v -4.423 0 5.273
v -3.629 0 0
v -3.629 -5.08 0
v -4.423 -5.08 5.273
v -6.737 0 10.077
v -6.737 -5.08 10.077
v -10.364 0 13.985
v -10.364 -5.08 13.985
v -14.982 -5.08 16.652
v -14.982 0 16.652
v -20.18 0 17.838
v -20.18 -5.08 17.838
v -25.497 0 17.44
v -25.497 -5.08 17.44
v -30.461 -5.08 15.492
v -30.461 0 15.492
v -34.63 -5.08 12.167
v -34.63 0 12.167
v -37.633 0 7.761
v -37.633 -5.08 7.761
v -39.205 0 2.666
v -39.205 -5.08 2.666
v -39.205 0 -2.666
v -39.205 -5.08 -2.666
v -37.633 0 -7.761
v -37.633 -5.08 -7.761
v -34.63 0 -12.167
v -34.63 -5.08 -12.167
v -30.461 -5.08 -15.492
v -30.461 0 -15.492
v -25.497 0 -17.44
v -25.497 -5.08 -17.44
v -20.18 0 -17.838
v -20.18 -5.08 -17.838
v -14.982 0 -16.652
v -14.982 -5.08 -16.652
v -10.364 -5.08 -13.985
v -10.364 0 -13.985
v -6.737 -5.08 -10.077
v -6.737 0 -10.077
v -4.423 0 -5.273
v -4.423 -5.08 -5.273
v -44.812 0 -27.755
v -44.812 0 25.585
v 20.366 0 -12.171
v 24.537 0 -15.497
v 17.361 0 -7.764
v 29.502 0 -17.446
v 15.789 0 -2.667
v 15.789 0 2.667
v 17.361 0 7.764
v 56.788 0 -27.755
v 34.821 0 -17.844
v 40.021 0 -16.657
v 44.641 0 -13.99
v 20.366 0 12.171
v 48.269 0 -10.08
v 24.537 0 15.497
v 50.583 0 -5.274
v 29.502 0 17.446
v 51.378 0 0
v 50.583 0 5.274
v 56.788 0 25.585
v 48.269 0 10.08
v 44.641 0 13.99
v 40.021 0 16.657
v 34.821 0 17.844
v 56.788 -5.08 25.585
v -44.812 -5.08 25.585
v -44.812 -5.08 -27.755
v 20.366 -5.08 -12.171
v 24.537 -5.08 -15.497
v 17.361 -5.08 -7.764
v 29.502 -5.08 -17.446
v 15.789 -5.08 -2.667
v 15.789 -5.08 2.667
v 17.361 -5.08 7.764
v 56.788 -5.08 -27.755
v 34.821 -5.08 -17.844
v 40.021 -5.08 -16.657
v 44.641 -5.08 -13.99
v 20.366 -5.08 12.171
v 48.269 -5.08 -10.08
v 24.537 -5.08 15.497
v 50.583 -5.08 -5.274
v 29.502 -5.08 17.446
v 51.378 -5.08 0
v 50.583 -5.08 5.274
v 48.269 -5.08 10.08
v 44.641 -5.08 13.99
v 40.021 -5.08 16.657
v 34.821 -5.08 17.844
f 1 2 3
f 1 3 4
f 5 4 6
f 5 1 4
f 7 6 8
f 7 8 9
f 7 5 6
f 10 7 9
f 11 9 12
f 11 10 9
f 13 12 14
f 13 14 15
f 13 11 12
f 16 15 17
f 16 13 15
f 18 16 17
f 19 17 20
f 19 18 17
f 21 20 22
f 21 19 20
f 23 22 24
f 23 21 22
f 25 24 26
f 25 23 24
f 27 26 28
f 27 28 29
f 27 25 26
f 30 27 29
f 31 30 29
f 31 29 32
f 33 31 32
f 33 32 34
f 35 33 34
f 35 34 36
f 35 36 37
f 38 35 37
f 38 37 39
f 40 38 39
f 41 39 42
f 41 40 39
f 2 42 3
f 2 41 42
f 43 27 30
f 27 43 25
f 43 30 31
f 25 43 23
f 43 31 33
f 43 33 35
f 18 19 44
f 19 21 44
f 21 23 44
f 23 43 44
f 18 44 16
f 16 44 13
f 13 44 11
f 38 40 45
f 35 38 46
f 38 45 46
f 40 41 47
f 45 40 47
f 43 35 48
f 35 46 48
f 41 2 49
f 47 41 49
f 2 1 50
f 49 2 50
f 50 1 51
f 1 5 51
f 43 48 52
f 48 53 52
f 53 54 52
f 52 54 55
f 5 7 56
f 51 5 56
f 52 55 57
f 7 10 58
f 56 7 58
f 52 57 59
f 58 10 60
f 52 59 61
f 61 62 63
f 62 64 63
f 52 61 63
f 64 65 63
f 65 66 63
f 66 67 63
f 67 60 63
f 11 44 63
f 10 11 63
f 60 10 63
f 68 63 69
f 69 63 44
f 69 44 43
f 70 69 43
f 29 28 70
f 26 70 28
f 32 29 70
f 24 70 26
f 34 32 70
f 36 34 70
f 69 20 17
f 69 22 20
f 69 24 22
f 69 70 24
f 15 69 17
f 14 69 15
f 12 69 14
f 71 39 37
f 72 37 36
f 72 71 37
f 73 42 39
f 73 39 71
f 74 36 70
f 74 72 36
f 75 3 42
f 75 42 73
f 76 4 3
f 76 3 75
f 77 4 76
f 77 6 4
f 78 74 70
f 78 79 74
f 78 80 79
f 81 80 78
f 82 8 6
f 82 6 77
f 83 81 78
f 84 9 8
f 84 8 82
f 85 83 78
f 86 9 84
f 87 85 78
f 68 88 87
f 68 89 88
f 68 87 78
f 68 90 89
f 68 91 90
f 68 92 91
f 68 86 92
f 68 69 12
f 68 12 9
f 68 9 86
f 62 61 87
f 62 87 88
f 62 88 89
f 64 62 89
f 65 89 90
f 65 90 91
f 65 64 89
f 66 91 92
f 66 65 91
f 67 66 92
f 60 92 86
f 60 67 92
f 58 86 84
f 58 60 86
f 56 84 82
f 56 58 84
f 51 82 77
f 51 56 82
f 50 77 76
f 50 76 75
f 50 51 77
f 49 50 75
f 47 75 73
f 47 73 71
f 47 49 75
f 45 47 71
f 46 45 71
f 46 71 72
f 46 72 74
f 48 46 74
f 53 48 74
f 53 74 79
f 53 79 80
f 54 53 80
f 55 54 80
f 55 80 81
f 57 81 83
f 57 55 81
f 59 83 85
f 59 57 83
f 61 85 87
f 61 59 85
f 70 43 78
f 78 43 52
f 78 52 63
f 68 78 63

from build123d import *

# Parameters (mm, degrees)
F0_R     = 17.888087
F0_R_2   = 17.8943
F1_DEPTH = 5.08


with BuildPart() as f1:
    # F0 (on Front) → F1 (new body)
    with BuildSketch(Plane.XZ):
        Polygon((56.788196, 25.584594), (-44.811804, 25.584593), (-44.811804, -27.755406), (56.788196, -27.755406), align=None)
        with Locations((-21.516809, 0)):
            Circle(F0_R, mode=Mode.SUBTRACT)
        with Locations((33.483696, 0)):
            Circle(F0_R_2, mode=Mode.SUBTRACT)
    extrude(amount=F1_DEPTH)


solid = f1.part
